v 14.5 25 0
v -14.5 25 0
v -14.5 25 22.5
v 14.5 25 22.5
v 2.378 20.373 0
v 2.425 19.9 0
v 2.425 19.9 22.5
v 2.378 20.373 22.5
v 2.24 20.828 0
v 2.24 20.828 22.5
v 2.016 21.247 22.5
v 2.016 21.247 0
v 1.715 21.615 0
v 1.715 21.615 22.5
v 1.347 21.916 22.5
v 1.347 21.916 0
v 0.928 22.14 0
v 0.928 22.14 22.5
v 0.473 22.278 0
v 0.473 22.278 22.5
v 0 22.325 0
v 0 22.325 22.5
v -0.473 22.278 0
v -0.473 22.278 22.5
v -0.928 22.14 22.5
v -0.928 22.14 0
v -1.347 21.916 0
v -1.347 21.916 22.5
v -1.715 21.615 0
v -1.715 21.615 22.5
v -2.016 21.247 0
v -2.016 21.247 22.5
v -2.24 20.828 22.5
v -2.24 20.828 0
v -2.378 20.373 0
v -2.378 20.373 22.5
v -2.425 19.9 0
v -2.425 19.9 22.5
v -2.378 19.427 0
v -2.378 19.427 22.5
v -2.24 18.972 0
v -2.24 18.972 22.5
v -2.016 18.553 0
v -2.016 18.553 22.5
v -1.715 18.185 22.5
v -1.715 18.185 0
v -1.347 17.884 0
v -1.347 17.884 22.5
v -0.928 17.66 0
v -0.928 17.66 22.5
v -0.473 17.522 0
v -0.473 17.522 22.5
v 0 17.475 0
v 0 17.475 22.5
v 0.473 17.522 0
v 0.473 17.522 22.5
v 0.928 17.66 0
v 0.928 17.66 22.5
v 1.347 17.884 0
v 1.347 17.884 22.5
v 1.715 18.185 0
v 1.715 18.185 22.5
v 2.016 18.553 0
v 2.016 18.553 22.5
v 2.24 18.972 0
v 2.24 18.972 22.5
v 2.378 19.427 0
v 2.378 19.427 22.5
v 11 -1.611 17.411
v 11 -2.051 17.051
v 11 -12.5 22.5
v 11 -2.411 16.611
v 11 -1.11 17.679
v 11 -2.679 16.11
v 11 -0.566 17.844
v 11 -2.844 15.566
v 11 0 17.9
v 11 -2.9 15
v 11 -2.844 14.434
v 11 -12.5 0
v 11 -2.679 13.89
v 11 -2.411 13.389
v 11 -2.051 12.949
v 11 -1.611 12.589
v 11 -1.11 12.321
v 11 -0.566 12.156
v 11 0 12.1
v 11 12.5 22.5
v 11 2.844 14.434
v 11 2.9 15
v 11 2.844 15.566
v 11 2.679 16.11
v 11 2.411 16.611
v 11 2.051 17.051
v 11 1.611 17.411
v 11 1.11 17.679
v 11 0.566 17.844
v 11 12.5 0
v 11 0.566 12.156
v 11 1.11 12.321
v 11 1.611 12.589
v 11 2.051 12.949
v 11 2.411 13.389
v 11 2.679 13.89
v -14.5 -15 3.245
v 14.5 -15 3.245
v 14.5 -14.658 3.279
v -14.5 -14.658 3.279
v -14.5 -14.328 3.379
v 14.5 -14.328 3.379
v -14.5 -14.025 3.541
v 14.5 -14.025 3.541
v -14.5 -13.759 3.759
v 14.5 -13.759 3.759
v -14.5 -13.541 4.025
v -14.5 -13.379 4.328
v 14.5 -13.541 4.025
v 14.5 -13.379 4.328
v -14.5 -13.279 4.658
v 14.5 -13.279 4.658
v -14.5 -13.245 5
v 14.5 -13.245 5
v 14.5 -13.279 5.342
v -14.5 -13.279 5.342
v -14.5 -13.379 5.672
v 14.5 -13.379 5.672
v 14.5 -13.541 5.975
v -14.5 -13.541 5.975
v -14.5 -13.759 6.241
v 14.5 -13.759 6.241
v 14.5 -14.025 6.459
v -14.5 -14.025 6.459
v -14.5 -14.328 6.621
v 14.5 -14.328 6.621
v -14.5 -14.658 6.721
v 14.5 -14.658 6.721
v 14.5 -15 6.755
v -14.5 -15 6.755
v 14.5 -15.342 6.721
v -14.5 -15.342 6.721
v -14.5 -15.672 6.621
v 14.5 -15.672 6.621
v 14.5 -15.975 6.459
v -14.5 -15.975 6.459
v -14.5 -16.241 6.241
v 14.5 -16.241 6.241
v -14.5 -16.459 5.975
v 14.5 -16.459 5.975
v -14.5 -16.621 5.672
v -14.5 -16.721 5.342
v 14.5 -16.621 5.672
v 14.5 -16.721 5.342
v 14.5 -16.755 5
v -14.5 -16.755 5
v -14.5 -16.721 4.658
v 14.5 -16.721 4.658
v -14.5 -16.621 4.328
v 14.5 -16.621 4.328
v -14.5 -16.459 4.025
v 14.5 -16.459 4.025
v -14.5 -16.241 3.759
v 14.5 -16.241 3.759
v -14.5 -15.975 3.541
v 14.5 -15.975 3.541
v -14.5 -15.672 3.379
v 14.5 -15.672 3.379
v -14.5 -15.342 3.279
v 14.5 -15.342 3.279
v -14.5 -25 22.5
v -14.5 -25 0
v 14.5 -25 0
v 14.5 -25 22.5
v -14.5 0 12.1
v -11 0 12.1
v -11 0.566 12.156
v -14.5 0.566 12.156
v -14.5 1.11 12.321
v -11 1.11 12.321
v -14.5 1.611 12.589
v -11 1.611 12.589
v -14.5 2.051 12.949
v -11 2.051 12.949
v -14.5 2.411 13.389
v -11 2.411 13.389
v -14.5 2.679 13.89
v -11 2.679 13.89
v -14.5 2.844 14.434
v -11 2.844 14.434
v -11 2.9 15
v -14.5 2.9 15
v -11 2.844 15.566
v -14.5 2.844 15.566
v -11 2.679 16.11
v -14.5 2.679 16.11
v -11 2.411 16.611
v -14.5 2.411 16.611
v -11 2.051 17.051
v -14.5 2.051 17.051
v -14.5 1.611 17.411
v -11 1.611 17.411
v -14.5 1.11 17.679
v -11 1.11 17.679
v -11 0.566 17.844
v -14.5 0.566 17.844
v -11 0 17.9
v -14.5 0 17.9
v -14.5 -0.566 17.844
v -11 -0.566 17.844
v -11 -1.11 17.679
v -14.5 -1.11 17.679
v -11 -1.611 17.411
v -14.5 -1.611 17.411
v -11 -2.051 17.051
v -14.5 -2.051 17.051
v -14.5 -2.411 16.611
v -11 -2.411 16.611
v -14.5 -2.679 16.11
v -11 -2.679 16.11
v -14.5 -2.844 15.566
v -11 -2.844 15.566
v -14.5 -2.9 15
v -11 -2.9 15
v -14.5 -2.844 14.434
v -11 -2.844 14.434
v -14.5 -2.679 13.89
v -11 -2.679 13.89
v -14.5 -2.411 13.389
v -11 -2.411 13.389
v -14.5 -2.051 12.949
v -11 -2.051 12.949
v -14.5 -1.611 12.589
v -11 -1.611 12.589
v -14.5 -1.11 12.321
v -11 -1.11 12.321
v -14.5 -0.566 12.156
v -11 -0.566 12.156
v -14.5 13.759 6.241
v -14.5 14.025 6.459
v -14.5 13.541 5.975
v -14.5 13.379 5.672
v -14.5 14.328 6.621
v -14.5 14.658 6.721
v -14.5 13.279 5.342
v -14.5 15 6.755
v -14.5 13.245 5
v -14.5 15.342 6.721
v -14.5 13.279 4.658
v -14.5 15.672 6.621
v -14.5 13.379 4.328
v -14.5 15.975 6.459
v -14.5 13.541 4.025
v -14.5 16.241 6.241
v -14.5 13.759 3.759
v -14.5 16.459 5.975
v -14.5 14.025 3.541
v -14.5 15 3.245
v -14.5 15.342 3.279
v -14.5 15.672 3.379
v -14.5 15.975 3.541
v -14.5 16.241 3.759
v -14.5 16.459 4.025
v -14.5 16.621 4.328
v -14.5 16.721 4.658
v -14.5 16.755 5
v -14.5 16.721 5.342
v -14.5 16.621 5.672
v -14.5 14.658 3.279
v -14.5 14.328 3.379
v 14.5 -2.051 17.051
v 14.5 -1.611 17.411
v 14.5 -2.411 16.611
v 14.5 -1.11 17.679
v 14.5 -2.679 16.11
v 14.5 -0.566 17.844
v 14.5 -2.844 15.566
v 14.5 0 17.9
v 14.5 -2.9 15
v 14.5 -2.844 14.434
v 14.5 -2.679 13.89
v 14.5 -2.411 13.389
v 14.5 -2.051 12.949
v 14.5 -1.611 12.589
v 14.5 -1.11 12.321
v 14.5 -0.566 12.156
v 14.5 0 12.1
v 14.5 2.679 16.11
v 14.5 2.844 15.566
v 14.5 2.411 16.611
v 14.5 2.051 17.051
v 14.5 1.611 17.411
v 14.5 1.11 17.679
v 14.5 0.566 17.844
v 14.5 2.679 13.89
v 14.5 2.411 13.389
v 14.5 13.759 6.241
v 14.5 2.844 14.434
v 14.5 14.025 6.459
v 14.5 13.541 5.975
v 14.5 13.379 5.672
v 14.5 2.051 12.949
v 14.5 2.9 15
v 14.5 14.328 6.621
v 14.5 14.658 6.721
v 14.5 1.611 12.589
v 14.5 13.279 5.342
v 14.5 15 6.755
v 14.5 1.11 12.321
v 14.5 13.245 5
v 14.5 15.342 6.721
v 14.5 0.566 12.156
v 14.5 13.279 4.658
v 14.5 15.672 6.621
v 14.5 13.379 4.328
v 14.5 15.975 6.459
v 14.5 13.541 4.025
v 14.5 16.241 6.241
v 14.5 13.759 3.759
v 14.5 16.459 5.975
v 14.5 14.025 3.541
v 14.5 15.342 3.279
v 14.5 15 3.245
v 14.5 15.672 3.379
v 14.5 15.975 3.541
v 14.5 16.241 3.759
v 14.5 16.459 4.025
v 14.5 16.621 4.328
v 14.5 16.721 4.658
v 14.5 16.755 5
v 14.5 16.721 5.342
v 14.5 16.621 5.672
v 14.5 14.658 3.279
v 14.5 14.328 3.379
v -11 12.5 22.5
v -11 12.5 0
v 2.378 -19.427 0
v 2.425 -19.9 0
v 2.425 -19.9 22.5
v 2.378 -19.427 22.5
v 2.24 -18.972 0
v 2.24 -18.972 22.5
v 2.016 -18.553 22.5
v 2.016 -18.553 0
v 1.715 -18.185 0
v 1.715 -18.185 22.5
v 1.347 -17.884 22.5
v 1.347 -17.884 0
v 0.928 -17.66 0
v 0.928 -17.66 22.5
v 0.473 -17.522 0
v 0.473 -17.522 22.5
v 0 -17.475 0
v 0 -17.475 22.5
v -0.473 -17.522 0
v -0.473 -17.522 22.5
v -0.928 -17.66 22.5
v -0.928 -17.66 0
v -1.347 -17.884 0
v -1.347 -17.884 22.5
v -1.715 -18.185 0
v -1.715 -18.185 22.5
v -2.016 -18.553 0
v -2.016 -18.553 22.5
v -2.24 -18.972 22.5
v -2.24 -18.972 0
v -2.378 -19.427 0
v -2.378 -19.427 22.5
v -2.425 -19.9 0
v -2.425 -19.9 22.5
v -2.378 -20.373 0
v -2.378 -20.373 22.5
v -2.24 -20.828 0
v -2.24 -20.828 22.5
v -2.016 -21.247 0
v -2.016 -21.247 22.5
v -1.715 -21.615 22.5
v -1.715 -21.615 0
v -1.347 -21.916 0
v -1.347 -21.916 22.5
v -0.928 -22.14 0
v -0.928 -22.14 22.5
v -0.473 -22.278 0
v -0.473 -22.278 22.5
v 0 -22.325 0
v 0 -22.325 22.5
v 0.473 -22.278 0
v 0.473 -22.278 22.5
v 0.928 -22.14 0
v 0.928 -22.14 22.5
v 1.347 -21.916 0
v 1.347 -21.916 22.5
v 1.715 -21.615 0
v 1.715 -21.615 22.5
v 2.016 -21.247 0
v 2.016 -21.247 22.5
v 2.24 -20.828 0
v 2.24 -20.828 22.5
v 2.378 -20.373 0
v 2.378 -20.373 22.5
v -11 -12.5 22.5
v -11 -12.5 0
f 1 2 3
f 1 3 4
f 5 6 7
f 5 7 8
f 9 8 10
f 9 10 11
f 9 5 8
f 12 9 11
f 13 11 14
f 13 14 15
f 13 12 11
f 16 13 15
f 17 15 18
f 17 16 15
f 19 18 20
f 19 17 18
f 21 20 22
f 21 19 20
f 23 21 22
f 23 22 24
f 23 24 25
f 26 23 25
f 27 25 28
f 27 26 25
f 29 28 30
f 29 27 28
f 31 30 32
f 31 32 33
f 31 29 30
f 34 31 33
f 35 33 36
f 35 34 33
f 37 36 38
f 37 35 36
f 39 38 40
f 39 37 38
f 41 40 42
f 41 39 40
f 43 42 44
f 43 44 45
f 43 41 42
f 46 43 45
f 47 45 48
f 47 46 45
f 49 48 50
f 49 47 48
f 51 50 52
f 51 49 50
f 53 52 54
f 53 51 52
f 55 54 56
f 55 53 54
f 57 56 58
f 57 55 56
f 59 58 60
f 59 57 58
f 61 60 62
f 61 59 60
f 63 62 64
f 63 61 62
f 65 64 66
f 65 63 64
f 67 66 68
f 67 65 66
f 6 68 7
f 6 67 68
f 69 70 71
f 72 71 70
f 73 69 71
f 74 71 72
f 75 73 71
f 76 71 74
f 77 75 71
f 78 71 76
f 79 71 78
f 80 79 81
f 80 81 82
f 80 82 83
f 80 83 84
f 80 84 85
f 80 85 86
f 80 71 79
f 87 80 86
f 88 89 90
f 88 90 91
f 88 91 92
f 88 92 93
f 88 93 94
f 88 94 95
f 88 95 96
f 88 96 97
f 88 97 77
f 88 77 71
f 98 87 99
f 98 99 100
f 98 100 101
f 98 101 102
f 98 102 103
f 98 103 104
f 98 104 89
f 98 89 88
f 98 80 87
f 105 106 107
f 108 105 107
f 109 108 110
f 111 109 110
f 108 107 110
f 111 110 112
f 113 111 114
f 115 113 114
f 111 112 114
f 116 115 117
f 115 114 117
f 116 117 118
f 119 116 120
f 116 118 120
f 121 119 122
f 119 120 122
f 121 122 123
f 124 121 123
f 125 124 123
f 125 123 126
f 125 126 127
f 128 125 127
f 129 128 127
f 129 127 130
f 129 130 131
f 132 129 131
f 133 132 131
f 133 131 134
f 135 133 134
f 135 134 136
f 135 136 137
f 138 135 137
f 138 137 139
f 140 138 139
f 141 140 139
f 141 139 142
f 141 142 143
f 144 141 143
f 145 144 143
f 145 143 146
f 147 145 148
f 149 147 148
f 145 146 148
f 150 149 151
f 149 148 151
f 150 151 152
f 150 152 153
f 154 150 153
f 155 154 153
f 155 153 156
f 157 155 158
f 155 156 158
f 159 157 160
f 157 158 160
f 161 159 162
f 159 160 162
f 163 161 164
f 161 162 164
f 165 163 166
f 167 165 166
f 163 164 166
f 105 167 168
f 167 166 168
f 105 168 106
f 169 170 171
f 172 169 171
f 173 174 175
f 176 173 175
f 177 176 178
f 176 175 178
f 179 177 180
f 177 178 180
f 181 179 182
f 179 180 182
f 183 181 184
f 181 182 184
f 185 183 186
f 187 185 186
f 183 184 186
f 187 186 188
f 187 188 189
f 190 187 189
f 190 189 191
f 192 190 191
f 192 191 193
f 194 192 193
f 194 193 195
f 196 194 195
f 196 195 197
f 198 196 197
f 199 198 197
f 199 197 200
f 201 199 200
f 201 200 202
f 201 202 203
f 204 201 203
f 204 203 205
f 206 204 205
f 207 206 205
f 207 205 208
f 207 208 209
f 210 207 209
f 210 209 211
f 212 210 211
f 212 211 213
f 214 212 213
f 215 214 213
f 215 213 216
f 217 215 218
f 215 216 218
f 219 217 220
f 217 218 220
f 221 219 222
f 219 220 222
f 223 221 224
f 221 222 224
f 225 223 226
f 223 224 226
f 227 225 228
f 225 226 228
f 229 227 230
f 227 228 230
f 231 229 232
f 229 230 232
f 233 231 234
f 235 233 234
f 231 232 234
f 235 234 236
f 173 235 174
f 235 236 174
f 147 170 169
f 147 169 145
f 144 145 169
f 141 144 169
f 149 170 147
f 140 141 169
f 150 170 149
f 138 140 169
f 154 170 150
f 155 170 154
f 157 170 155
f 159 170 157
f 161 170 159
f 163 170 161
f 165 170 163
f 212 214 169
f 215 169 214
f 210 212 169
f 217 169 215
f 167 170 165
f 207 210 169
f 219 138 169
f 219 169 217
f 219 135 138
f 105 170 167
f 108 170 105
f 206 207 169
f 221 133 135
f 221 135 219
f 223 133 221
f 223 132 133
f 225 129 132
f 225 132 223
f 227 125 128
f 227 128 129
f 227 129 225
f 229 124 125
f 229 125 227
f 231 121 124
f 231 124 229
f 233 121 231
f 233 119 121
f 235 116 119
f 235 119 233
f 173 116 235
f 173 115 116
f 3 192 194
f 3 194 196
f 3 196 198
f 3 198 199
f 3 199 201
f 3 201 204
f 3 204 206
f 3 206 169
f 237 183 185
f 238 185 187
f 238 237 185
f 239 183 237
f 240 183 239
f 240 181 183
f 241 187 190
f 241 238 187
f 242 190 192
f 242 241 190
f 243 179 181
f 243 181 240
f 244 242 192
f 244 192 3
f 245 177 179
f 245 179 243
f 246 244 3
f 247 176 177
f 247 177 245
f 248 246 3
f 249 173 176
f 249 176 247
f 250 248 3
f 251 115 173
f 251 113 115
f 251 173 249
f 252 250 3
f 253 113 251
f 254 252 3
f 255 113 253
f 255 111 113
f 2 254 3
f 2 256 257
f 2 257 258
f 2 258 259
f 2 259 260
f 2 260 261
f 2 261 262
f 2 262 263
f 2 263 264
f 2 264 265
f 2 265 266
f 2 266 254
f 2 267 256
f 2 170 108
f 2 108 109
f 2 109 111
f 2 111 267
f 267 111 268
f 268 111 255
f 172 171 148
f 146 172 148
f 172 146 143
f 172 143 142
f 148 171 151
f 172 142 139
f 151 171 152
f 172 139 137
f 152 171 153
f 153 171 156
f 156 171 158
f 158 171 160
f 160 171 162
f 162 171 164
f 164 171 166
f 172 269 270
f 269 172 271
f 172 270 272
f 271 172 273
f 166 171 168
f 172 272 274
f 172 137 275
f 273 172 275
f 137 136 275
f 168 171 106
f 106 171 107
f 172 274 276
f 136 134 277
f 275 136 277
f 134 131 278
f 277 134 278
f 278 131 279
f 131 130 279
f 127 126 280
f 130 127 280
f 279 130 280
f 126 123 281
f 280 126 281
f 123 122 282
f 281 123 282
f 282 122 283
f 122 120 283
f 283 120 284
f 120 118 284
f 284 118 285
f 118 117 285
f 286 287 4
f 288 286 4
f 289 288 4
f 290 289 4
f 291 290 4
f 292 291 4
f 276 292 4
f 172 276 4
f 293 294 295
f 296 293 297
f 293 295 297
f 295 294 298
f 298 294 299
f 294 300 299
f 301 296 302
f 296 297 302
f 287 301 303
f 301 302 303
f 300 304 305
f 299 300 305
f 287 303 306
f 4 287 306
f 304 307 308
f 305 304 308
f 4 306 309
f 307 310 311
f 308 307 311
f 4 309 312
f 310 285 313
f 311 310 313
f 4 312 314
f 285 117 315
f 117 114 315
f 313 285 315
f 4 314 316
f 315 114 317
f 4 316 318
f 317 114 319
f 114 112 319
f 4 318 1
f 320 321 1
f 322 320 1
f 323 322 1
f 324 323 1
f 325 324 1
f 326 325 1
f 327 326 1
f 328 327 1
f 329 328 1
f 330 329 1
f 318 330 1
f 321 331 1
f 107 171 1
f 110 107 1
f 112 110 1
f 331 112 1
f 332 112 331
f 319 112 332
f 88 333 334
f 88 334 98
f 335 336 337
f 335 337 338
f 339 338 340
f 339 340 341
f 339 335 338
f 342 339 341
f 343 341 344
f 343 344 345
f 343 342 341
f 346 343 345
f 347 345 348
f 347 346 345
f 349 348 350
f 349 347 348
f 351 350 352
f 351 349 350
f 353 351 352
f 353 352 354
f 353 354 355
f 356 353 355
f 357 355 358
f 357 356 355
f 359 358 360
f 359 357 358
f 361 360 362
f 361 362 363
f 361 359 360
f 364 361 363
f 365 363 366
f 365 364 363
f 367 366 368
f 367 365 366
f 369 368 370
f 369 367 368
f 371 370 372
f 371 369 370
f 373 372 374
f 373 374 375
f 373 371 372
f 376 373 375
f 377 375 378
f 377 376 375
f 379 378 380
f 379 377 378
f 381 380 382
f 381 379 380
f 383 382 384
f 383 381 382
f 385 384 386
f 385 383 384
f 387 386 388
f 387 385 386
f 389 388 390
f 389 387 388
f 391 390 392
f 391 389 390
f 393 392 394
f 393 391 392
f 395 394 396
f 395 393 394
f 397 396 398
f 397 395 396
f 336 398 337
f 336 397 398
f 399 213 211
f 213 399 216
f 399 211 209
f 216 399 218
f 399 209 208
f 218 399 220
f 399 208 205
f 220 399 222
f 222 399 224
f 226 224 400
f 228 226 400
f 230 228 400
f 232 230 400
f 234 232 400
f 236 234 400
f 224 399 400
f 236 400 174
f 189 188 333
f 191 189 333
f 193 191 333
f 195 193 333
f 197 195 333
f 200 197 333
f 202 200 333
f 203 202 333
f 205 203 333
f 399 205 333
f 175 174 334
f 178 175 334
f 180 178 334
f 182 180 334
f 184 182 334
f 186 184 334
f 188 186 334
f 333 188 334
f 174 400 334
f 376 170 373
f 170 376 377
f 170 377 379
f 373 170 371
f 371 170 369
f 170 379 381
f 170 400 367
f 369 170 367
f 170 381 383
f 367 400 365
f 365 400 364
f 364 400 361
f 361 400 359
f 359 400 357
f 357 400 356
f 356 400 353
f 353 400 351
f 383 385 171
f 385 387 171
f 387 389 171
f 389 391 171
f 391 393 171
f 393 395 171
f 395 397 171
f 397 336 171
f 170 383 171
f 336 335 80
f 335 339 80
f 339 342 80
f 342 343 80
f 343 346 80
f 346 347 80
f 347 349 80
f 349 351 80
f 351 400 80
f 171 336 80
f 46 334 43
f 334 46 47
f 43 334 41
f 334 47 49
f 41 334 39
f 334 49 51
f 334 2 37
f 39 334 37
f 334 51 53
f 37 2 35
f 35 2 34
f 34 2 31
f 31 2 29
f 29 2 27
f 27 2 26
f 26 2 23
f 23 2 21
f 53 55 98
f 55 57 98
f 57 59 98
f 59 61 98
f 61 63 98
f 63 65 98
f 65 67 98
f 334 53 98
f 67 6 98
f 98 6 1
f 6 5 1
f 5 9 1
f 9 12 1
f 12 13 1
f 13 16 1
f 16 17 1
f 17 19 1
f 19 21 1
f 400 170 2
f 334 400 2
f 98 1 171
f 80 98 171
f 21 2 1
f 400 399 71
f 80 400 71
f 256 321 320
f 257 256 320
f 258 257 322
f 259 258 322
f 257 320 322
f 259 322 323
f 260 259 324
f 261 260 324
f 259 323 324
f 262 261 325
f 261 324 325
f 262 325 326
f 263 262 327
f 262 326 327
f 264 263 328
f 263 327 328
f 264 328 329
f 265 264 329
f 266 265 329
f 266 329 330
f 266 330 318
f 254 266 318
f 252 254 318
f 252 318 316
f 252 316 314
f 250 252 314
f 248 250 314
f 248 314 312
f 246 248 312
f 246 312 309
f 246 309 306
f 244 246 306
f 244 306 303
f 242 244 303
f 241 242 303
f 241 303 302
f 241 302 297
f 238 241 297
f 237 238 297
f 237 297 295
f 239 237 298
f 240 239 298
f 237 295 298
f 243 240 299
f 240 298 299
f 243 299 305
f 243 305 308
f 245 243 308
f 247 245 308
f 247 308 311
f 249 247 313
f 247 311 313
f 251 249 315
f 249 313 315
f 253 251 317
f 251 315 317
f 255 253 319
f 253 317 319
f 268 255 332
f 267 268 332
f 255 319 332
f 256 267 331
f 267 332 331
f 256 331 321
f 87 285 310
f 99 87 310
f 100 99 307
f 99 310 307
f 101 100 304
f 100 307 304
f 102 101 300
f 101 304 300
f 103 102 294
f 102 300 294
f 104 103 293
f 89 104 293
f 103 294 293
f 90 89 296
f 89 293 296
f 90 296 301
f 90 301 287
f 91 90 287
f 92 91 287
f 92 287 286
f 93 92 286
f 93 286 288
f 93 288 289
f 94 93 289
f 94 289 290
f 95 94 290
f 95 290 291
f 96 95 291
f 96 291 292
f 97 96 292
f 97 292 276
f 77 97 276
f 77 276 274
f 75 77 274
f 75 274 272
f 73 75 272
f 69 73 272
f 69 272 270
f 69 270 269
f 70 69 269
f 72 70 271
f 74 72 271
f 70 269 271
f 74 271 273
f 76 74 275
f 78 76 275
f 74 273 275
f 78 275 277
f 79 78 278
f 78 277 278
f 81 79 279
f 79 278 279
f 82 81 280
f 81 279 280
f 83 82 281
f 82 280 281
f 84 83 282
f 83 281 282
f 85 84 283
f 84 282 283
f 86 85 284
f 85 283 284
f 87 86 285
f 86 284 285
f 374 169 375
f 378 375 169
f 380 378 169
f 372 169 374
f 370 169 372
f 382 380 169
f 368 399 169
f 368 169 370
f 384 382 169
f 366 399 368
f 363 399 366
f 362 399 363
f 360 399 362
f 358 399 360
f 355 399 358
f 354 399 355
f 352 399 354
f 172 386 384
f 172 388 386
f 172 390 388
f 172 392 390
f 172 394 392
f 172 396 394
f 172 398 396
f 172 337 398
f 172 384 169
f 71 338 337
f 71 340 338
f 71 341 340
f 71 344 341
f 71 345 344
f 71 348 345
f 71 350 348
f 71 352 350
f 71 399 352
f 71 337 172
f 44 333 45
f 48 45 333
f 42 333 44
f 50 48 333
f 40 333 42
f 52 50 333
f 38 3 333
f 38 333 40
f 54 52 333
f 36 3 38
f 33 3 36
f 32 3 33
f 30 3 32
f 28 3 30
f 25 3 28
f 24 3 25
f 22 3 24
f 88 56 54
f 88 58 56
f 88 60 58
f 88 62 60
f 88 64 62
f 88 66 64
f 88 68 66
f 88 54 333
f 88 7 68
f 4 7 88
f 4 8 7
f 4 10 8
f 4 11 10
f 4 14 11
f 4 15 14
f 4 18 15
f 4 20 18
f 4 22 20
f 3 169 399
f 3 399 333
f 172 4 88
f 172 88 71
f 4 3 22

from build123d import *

# Parameters (mm, degrees)
SKETCH2_W           = 29
SKETCH2_H           = 50
SKETCH2_R           = 2.425
SKETCH2_W_2         = 22
SKETCH2_H_2         = 25
BOSS_EXTRUDE1_DEPTH = 22.5
SKETCH3_R           = 1.755
SKETCH3_R_2         = 2.9
CUT_EXTRUDE1_DEPTH  = 30


with BuildPart() as part:
    # Sketch2 → Boss-Extrude1 (new body)
    with BuildSketch(Plane.XY):
        Rectangle(SKETCH2_W, SKETCH2_H)
        with Locations((0, 19.9)):
            Circle(SKETCH2_R, mode=Mode.SUBTRACT)
        with Locations((0, -19.9)):
            Circle(SKETCH2_R, mode=Mode.SUBTRACT)
        Rectangle(SKETCH2_W_2, SKETCH2_H_2, mode=Mode.SUBTRACT)
    extrude(amount=BOSS_EXTRUDE1_DEPTH)

    # Sketch3 → Cut-Extrude1 (cut)
    with BuildSketch(Plane(origin=(14.5, 0, 0), x_dir=(0, 0, -1), z_dir=(1, 0, 0))):
        with Locations((-5, 15)):
            Circle(SKETCH3_R)
        with Locations((-5, -15)):
            Circle(SKETCH3_R)
        with Locations((-15, 0)):
            Circle(SKETCH3_R_2)
    extrude(amount=-CUT_EXTRUDE1_DEPTH, mode=Mode.SUBTRACT)


solid = part.part
